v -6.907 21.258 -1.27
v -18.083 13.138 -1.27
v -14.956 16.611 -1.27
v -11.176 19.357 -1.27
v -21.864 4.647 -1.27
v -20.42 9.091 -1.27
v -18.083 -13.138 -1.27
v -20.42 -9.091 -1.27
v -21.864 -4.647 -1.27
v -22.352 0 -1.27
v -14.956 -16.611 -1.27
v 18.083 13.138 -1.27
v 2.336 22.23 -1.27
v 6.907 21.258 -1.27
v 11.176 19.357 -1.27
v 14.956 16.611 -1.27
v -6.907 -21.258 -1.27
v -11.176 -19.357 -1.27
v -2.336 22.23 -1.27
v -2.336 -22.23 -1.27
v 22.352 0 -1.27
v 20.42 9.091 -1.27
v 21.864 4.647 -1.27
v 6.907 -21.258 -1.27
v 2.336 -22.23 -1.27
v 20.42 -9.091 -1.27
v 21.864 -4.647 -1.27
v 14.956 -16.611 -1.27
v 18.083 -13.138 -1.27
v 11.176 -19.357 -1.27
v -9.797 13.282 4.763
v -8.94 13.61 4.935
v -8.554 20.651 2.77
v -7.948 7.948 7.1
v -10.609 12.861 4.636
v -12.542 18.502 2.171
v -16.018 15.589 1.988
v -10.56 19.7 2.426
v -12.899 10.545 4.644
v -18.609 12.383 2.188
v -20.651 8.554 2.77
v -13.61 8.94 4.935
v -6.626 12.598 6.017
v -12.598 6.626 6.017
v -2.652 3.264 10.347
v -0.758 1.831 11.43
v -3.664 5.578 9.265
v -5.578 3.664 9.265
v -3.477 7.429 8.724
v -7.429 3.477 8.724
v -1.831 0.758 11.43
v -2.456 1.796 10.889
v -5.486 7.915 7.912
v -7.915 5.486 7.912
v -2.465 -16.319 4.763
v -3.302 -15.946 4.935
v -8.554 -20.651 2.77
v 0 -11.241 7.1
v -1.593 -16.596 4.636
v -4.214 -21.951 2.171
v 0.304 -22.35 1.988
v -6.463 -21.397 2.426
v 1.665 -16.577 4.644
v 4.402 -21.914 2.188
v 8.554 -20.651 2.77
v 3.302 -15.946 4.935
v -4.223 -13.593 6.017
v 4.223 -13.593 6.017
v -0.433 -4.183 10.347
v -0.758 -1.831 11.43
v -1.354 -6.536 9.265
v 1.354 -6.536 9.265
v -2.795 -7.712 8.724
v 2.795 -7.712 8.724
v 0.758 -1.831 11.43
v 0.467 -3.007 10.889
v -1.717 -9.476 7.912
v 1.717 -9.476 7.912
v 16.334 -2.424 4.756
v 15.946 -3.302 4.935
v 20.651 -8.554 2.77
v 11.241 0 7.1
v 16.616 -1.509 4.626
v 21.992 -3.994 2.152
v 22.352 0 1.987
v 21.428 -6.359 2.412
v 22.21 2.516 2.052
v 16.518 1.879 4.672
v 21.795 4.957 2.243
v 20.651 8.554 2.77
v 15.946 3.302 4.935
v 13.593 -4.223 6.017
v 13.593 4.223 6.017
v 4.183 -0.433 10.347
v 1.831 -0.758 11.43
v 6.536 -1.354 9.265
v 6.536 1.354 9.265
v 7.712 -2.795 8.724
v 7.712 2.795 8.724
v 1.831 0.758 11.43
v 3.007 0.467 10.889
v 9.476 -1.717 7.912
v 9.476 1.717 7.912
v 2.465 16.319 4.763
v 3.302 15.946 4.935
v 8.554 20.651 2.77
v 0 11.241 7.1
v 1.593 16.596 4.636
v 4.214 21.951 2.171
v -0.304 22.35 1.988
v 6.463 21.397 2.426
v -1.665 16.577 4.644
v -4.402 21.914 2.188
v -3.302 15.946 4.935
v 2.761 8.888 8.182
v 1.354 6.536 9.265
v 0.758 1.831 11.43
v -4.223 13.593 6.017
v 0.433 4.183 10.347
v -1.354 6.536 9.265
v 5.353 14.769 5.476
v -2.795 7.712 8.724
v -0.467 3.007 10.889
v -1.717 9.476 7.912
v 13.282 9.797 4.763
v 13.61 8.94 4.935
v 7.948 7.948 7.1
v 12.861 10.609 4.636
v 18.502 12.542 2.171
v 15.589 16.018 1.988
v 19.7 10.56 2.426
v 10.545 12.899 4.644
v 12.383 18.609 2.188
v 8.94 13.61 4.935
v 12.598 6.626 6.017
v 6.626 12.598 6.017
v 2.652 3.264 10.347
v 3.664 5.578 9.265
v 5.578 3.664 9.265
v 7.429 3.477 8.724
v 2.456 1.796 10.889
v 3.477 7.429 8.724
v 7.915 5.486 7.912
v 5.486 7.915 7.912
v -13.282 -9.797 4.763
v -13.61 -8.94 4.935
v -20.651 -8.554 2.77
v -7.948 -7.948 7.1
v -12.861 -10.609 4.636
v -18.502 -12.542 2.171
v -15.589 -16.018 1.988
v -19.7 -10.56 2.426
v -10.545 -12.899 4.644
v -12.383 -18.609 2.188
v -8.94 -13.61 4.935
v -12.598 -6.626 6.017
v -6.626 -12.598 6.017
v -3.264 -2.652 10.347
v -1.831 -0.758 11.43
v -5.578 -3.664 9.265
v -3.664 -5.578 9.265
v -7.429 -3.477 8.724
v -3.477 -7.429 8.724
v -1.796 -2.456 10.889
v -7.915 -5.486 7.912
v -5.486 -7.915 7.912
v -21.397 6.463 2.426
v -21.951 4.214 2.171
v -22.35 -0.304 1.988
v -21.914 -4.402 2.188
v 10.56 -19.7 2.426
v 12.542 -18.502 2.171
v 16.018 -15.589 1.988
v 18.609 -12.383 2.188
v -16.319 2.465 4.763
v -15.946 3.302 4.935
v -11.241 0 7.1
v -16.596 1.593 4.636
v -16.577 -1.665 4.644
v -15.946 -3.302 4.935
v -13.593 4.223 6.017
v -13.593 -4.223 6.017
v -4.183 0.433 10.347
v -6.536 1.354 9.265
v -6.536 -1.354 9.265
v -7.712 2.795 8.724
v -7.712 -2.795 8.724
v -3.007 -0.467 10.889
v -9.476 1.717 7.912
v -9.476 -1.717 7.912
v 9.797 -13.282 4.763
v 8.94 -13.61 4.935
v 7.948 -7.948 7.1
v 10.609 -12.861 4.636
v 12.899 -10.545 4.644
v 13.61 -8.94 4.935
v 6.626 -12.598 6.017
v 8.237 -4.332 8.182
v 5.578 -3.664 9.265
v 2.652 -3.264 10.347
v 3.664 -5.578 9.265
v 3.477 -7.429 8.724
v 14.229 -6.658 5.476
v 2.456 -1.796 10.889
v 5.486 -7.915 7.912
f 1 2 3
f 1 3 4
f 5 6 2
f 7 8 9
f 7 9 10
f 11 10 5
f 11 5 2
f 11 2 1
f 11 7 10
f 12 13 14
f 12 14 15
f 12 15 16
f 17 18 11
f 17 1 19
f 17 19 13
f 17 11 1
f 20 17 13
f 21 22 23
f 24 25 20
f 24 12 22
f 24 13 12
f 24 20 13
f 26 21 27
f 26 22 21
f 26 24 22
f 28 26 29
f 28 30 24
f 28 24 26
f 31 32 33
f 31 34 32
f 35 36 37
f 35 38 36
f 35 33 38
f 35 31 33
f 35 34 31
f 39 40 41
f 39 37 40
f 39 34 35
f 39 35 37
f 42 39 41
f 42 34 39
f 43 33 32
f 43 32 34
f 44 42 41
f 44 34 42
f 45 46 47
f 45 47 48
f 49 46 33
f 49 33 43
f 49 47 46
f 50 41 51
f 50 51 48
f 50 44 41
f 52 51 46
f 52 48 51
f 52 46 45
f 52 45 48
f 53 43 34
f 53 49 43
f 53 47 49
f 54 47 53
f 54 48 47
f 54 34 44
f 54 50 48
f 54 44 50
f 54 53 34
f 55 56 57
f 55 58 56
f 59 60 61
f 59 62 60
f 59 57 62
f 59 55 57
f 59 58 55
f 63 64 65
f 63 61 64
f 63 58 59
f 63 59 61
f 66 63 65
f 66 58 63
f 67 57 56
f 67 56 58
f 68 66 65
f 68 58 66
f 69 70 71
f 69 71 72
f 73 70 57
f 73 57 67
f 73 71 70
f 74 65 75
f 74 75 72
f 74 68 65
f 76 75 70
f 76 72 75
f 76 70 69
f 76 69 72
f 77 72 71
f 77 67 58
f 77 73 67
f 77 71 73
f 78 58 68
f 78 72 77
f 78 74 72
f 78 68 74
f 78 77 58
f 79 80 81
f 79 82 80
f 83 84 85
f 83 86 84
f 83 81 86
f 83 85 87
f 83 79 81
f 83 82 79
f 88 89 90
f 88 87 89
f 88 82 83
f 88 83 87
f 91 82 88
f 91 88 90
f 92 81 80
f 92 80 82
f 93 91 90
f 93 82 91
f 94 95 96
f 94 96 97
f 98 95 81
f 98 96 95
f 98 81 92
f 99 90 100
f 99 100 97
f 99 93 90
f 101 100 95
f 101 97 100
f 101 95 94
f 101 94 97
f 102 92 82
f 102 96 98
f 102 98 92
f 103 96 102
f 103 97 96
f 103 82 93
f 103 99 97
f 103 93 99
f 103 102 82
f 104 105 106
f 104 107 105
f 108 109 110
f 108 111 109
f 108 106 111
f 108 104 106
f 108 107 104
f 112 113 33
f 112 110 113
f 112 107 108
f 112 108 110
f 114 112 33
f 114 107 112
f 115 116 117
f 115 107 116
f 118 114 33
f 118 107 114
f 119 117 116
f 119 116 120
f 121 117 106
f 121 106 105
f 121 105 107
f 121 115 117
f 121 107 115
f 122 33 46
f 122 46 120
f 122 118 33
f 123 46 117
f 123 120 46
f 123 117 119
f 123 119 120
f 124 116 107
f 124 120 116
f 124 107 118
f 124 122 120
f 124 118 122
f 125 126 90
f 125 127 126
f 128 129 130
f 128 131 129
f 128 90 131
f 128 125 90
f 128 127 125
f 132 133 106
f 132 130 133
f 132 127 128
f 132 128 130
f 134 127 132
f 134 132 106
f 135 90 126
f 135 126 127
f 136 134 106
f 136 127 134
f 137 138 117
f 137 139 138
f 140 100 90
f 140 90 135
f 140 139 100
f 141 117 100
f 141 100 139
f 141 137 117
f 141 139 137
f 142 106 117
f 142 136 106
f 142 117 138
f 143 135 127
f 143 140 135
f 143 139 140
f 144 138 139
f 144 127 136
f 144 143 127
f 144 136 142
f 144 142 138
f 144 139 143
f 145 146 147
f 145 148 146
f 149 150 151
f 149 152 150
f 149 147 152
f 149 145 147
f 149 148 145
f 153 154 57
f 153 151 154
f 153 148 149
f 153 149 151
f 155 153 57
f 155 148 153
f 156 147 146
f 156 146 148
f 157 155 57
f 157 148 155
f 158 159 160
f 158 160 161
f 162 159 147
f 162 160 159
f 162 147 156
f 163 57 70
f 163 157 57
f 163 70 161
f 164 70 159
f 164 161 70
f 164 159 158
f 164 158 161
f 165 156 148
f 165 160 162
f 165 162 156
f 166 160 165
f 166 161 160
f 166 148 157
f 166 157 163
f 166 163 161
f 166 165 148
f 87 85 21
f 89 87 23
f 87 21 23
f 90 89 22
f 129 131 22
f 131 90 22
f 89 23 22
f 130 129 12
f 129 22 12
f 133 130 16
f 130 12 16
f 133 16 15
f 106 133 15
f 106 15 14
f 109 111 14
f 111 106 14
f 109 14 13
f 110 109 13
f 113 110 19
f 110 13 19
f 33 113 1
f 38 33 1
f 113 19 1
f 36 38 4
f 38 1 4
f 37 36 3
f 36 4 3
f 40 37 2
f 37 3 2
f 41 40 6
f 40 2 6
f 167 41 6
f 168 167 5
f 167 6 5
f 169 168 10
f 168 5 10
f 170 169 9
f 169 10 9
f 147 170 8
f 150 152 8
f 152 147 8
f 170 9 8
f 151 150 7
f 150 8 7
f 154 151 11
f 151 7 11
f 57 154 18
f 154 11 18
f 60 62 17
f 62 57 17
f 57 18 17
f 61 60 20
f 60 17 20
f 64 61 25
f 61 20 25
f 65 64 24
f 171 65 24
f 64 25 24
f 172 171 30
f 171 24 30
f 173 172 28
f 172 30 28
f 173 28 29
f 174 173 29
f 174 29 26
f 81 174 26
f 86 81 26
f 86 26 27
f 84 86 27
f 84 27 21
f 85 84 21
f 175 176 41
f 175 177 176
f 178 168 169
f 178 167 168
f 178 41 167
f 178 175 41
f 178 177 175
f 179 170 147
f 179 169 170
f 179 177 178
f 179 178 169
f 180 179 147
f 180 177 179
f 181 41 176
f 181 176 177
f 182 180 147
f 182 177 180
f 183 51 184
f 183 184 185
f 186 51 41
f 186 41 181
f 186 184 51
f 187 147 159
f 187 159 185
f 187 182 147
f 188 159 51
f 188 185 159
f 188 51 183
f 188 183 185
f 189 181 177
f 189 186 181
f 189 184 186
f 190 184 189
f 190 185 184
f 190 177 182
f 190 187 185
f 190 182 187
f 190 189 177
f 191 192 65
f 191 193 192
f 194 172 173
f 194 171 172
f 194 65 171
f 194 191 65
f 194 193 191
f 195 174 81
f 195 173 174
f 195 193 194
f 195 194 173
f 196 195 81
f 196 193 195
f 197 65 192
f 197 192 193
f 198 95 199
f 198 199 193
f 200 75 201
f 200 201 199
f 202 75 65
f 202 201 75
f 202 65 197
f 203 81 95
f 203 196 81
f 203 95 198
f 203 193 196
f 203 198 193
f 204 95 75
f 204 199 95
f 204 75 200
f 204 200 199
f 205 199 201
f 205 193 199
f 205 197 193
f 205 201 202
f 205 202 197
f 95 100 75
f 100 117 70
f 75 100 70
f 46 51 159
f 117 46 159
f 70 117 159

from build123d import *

# Parameters (mm, degrees)
F4_R     = 22.352
F5_DEPTH = 1.27
F6_R     = 33.967932
F6_R_2   = 22.352
F7_DEPTH = 25.4


with BuildPart() as f3:
    # F0 (on Top) → F3 section 0
    with BuildSketch(Plane.XY):
        Polygon((11.047076, 26.67), (-11.047076, 26.67), (-26.67, 11.047076), (-26.67, -11.047076), (-11.047076, -26.67), (11.047076, -26.67), (26.67, -11.047076), (26.67, 11.047076), align=None)
    # F2 (on offset) → F3 section 1
    with BuildSketch(Plane.XY.offset(11.43)):
        Polygon((0.75823, 1.830529), (-0.75823, 1.830529), (-1.830529, 0.75823), (-1.830529, -0.75823), (-0.75823, -1.830529), (0.75823, -1.830529), (1.830529, -0.75823), (1.830529, 0.75823), align=None)
    loft()

    # F4 (on face) → F5 (join)
    with BuildSketch(Plane(origin=(0, 0, 0), x_dir=(1, 0, 0), z_dir=(0, 0, -1))):
        Circle(F4_R)
    extrude(amount=F5_DEPTH)

    # F6 (on Top) → F7 (cut)
    with BuildSketch(Plane.XY):
        Circle(F6_R)
        Circle(F6_R_2, mode=Mode.SUBTRACT)
    extrude(amount=F7_DEPTH, mode=Mode.SUBTRACT)


solid = f3.part
